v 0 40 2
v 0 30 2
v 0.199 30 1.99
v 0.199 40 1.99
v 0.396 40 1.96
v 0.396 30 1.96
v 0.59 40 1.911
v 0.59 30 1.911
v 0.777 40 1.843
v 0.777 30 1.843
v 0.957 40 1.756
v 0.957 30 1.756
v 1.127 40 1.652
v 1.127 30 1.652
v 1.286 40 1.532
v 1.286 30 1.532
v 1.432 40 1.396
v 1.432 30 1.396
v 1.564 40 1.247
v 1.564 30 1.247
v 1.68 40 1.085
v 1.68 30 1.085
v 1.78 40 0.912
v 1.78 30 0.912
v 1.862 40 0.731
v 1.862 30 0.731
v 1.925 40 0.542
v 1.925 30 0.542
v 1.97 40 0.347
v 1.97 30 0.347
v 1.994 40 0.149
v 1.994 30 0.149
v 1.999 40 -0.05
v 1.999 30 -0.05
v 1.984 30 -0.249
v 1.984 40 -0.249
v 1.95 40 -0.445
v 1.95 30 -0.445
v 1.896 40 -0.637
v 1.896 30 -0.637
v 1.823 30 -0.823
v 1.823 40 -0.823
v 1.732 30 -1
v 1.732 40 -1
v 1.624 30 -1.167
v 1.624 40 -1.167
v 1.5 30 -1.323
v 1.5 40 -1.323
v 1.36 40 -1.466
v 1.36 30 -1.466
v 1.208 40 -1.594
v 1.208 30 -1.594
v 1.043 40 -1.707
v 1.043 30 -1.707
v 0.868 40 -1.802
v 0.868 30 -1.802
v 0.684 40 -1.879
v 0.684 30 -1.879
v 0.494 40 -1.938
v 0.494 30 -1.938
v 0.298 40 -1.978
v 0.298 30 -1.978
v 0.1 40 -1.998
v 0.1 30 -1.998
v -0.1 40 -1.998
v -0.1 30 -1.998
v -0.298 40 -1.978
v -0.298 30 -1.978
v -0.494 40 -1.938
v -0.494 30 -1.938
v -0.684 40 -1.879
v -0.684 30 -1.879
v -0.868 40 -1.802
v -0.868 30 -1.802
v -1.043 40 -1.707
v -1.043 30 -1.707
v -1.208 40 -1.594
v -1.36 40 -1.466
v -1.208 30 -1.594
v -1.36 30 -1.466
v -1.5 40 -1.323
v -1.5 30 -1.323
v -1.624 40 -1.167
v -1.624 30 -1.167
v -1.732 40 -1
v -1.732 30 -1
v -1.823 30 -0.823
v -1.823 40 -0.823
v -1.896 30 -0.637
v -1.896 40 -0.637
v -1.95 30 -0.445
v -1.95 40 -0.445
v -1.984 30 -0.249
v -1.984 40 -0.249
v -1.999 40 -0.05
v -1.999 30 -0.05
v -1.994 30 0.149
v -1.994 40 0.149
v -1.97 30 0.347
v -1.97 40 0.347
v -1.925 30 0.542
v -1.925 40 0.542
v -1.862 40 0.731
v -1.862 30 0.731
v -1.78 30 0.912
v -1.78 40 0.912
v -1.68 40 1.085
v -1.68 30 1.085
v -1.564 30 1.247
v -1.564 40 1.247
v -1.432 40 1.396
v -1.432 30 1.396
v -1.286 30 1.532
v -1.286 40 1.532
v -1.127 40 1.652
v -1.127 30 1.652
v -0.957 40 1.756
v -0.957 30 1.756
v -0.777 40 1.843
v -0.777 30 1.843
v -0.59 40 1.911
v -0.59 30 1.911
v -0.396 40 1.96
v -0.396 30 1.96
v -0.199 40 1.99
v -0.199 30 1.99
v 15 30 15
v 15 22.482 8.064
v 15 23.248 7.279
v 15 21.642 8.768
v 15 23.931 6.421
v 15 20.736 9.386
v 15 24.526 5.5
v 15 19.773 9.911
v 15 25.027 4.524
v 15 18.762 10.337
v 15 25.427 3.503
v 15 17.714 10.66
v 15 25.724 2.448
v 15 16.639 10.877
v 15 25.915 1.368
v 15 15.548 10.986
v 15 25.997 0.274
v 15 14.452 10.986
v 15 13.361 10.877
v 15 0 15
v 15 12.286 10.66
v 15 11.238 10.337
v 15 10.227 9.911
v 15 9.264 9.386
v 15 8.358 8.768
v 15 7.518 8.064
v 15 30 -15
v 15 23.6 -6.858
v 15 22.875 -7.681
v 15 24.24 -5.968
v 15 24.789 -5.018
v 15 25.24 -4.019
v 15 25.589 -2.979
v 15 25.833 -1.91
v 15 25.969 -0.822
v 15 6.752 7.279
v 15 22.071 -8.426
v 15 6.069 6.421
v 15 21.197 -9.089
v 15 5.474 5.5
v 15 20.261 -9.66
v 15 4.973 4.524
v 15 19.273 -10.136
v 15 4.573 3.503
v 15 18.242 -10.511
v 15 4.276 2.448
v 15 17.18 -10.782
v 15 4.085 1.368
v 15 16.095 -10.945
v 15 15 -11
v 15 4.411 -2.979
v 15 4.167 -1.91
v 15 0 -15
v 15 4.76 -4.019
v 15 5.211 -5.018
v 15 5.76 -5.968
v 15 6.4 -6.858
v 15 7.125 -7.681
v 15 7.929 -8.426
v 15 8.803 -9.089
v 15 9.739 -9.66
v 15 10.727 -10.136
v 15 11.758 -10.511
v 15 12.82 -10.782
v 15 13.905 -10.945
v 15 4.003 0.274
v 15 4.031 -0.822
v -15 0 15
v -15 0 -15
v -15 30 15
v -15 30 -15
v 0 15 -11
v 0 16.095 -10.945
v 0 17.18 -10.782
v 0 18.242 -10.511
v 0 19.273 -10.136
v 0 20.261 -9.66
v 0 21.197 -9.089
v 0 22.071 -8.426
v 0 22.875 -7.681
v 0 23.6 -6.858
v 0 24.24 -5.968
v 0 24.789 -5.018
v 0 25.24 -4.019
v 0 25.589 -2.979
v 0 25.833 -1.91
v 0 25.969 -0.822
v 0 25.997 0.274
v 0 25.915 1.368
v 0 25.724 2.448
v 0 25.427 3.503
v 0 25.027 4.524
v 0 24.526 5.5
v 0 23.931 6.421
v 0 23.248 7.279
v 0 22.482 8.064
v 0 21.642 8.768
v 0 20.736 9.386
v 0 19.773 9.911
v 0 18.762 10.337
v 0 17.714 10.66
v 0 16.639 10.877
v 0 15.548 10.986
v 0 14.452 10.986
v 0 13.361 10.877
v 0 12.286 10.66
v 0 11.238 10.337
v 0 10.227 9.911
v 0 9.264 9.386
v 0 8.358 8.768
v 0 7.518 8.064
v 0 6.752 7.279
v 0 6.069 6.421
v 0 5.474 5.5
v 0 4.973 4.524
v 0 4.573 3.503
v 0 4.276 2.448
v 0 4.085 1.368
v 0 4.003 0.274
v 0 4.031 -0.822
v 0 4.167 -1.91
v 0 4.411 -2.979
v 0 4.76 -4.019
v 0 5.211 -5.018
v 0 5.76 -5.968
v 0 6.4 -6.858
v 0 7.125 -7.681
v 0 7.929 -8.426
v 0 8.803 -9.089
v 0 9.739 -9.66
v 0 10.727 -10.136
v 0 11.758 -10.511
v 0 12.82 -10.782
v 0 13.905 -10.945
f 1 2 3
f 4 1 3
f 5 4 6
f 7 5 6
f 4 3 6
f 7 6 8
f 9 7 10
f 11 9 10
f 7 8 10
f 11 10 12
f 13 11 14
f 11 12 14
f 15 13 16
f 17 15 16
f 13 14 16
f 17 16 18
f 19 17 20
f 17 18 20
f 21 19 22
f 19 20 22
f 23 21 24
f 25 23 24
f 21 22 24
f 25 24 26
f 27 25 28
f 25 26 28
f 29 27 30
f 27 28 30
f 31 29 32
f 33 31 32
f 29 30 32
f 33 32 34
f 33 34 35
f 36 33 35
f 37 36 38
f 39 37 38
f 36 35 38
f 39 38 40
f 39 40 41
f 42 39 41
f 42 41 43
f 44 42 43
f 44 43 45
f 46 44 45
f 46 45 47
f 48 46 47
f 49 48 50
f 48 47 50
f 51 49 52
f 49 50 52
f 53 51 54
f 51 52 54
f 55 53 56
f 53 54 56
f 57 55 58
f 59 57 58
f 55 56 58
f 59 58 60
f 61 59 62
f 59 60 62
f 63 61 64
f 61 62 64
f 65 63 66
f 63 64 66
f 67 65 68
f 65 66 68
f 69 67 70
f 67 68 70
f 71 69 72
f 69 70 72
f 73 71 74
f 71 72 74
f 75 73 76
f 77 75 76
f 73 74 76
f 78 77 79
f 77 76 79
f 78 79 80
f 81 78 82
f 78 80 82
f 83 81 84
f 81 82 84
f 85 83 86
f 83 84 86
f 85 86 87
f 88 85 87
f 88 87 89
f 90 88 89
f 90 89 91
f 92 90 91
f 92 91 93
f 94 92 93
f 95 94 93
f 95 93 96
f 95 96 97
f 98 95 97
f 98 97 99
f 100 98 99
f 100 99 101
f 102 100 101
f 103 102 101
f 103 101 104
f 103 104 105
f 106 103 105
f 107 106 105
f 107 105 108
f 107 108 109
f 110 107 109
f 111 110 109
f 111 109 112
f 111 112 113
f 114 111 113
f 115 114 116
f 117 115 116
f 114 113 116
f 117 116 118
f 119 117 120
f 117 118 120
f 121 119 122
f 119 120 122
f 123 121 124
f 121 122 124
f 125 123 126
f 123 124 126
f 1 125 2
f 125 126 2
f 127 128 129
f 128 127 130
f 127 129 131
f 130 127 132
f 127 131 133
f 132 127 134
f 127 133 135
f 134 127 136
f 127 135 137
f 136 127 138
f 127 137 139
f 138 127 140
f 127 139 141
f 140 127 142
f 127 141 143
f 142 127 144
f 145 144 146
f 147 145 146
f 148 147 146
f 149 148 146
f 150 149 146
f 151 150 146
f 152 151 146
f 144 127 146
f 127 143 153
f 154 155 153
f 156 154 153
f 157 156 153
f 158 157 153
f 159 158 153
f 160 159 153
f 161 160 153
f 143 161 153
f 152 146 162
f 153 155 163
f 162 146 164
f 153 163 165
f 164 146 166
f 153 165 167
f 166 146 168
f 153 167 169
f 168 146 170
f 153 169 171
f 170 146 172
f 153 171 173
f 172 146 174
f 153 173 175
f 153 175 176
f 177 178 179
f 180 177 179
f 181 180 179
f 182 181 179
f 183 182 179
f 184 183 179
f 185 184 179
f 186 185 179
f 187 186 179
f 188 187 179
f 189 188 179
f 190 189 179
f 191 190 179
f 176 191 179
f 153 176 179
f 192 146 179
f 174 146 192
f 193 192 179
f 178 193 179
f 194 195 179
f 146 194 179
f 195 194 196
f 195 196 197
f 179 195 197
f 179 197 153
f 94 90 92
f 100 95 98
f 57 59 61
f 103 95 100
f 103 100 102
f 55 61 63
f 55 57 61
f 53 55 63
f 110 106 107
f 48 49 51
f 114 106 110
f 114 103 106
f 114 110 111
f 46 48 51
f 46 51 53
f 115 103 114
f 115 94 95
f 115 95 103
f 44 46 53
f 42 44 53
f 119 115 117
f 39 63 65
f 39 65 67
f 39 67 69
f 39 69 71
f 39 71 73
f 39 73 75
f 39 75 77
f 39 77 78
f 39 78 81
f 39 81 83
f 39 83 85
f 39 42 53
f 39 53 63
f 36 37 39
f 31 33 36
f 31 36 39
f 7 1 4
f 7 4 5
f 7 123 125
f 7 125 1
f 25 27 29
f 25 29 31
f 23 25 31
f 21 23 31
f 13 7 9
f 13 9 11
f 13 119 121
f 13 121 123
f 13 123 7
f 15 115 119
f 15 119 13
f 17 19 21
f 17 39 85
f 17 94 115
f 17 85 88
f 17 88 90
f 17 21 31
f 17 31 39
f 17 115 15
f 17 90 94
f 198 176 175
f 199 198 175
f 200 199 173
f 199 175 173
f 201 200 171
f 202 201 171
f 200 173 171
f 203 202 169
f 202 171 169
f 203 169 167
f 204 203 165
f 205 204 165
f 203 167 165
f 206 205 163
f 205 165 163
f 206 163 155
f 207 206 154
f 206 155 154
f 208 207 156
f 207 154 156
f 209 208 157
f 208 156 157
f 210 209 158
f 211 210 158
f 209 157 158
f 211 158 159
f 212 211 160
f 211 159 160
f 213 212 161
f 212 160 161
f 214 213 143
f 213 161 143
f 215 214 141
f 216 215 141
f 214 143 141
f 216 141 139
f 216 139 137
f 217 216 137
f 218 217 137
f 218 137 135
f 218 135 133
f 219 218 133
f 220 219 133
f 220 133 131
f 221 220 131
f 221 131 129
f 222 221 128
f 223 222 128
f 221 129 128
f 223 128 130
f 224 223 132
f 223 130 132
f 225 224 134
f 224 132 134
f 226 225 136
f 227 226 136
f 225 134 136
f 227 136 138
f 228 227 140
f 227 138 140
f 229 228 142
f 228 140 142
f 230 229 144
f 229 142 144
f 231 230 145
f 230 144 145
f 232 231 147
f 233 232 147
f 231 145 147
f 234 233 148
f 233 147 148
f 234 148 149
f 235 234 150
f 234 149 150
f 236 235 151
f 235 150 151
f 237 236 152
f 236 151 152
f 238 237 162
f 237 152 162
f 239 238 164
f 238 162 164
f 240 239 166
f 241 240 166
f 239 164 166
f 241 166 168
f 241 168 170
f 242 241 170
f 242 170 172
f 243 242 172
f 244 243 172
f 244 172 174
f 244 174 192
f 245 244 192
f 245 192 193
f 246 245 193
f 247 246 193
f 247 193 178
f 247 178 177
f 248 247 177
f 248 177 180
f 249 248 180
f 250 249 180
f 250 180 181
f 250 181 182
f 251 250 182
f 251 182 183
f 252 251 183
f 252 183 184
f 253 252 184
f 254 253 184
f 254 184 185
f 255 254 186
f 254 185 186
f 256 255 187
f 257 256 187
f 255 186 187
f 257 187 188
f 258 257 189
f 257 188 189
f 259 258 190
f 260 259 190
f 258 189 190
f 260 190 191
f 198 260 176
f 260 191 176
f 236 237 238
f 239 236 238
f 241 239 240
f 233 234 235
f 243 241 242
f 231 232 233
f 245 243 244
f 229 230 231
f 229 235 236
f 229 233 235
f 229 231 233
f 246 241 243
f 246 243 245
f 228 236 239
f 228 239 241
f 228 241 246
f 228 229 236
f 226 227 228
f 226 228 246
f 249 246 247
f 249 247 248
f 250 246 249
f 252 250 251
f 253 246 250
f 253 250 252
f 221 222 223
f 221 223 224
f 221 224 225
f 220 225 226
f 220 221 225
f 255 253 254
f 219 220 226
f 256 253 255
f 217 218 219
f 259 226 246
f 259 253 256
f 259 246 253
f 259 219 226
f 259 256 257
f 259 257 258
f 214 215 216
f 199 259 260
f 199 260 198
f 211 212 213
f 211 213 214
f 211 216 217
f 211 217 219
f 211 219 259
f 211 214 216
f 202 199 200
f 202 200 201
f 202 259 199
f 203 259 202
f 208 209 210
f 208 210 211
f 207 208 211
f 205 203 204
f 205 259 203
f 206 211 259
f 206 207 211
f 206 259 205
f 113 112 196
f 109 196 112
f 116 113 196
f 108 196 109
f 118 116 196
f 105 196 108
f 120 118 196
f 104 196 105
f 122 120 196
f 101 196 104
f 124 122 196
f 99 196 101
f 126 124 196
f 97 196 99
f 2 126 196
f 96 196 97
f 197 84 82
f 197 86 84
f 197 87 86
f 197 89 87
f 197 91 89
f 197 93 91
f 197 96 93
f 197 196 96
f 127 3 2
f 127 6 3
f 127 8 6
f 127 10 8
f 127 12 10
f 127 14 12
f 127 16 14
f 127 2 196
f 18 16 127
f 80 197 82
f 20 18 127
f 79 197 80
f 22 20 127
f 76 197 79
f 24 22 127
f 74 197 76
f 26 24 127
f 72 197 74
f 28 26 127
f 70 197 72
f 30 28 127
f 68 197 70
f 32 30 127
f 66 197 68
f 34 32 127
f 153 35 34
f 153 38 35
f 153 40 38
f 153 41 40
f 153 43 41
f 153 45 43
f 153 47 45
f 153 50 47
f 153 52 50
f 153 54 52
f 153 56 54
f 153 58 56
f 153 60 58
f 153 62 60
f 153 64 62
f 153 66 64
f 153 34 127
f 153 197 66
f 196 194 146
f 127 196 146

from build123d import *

# Parameters (mm, degrees)
SKETCH1_W           = 30
SKETCH1_H           = 30
BOSS_EXTRUDE1_DEPTH = 30
SKETCH2_R           = 11
CUT_EXTRUDE1_DEPTH  = 15
SKETCH3_R           = 2
BOSS_EXTRUDE2_DEPTH = 10


with BuildPart() as part:
    # Sketch1 → Boss-Extrude1 (new body)
    with BuildSketch(Plane(origin=(0, 0, 0), x_dir=(1, 0, 0), z_dir=(0, 1, 0))):
        Rectangle(SKETCH1_W, SKETCH1_H)
    extrude(amount=BOSS_EXTRUDE1_DEPTH)

    # Sketch2 → Cut-Extrude1 (cut)
    with BuildSketch(Plane(origin=(15, 0, 0), x_dir=(0, 0, -1), z_dir=(1, 0, 0))):
        with Locations((0, 15)):
            Circle(SKETCH2_R)
    extrude(amount=-CUT_EXTRUDE1_DEPTH, mode=Mode.SUBTRACT)

    # Sketch3 → Boss-Extrude2 (add)
    with BuildSketch(Plane(origin=(0, 30, 0), x_dir=(1, 0, 0), z_dir=(0, 1, 0))):
        with Locations(Location((0, 0, 0), (0, 0, 270))):
            Circle(SKETCH3_R)
    extrude(amount=BOSS_EXTRUDE2_DEPTH)


solid = part.part
